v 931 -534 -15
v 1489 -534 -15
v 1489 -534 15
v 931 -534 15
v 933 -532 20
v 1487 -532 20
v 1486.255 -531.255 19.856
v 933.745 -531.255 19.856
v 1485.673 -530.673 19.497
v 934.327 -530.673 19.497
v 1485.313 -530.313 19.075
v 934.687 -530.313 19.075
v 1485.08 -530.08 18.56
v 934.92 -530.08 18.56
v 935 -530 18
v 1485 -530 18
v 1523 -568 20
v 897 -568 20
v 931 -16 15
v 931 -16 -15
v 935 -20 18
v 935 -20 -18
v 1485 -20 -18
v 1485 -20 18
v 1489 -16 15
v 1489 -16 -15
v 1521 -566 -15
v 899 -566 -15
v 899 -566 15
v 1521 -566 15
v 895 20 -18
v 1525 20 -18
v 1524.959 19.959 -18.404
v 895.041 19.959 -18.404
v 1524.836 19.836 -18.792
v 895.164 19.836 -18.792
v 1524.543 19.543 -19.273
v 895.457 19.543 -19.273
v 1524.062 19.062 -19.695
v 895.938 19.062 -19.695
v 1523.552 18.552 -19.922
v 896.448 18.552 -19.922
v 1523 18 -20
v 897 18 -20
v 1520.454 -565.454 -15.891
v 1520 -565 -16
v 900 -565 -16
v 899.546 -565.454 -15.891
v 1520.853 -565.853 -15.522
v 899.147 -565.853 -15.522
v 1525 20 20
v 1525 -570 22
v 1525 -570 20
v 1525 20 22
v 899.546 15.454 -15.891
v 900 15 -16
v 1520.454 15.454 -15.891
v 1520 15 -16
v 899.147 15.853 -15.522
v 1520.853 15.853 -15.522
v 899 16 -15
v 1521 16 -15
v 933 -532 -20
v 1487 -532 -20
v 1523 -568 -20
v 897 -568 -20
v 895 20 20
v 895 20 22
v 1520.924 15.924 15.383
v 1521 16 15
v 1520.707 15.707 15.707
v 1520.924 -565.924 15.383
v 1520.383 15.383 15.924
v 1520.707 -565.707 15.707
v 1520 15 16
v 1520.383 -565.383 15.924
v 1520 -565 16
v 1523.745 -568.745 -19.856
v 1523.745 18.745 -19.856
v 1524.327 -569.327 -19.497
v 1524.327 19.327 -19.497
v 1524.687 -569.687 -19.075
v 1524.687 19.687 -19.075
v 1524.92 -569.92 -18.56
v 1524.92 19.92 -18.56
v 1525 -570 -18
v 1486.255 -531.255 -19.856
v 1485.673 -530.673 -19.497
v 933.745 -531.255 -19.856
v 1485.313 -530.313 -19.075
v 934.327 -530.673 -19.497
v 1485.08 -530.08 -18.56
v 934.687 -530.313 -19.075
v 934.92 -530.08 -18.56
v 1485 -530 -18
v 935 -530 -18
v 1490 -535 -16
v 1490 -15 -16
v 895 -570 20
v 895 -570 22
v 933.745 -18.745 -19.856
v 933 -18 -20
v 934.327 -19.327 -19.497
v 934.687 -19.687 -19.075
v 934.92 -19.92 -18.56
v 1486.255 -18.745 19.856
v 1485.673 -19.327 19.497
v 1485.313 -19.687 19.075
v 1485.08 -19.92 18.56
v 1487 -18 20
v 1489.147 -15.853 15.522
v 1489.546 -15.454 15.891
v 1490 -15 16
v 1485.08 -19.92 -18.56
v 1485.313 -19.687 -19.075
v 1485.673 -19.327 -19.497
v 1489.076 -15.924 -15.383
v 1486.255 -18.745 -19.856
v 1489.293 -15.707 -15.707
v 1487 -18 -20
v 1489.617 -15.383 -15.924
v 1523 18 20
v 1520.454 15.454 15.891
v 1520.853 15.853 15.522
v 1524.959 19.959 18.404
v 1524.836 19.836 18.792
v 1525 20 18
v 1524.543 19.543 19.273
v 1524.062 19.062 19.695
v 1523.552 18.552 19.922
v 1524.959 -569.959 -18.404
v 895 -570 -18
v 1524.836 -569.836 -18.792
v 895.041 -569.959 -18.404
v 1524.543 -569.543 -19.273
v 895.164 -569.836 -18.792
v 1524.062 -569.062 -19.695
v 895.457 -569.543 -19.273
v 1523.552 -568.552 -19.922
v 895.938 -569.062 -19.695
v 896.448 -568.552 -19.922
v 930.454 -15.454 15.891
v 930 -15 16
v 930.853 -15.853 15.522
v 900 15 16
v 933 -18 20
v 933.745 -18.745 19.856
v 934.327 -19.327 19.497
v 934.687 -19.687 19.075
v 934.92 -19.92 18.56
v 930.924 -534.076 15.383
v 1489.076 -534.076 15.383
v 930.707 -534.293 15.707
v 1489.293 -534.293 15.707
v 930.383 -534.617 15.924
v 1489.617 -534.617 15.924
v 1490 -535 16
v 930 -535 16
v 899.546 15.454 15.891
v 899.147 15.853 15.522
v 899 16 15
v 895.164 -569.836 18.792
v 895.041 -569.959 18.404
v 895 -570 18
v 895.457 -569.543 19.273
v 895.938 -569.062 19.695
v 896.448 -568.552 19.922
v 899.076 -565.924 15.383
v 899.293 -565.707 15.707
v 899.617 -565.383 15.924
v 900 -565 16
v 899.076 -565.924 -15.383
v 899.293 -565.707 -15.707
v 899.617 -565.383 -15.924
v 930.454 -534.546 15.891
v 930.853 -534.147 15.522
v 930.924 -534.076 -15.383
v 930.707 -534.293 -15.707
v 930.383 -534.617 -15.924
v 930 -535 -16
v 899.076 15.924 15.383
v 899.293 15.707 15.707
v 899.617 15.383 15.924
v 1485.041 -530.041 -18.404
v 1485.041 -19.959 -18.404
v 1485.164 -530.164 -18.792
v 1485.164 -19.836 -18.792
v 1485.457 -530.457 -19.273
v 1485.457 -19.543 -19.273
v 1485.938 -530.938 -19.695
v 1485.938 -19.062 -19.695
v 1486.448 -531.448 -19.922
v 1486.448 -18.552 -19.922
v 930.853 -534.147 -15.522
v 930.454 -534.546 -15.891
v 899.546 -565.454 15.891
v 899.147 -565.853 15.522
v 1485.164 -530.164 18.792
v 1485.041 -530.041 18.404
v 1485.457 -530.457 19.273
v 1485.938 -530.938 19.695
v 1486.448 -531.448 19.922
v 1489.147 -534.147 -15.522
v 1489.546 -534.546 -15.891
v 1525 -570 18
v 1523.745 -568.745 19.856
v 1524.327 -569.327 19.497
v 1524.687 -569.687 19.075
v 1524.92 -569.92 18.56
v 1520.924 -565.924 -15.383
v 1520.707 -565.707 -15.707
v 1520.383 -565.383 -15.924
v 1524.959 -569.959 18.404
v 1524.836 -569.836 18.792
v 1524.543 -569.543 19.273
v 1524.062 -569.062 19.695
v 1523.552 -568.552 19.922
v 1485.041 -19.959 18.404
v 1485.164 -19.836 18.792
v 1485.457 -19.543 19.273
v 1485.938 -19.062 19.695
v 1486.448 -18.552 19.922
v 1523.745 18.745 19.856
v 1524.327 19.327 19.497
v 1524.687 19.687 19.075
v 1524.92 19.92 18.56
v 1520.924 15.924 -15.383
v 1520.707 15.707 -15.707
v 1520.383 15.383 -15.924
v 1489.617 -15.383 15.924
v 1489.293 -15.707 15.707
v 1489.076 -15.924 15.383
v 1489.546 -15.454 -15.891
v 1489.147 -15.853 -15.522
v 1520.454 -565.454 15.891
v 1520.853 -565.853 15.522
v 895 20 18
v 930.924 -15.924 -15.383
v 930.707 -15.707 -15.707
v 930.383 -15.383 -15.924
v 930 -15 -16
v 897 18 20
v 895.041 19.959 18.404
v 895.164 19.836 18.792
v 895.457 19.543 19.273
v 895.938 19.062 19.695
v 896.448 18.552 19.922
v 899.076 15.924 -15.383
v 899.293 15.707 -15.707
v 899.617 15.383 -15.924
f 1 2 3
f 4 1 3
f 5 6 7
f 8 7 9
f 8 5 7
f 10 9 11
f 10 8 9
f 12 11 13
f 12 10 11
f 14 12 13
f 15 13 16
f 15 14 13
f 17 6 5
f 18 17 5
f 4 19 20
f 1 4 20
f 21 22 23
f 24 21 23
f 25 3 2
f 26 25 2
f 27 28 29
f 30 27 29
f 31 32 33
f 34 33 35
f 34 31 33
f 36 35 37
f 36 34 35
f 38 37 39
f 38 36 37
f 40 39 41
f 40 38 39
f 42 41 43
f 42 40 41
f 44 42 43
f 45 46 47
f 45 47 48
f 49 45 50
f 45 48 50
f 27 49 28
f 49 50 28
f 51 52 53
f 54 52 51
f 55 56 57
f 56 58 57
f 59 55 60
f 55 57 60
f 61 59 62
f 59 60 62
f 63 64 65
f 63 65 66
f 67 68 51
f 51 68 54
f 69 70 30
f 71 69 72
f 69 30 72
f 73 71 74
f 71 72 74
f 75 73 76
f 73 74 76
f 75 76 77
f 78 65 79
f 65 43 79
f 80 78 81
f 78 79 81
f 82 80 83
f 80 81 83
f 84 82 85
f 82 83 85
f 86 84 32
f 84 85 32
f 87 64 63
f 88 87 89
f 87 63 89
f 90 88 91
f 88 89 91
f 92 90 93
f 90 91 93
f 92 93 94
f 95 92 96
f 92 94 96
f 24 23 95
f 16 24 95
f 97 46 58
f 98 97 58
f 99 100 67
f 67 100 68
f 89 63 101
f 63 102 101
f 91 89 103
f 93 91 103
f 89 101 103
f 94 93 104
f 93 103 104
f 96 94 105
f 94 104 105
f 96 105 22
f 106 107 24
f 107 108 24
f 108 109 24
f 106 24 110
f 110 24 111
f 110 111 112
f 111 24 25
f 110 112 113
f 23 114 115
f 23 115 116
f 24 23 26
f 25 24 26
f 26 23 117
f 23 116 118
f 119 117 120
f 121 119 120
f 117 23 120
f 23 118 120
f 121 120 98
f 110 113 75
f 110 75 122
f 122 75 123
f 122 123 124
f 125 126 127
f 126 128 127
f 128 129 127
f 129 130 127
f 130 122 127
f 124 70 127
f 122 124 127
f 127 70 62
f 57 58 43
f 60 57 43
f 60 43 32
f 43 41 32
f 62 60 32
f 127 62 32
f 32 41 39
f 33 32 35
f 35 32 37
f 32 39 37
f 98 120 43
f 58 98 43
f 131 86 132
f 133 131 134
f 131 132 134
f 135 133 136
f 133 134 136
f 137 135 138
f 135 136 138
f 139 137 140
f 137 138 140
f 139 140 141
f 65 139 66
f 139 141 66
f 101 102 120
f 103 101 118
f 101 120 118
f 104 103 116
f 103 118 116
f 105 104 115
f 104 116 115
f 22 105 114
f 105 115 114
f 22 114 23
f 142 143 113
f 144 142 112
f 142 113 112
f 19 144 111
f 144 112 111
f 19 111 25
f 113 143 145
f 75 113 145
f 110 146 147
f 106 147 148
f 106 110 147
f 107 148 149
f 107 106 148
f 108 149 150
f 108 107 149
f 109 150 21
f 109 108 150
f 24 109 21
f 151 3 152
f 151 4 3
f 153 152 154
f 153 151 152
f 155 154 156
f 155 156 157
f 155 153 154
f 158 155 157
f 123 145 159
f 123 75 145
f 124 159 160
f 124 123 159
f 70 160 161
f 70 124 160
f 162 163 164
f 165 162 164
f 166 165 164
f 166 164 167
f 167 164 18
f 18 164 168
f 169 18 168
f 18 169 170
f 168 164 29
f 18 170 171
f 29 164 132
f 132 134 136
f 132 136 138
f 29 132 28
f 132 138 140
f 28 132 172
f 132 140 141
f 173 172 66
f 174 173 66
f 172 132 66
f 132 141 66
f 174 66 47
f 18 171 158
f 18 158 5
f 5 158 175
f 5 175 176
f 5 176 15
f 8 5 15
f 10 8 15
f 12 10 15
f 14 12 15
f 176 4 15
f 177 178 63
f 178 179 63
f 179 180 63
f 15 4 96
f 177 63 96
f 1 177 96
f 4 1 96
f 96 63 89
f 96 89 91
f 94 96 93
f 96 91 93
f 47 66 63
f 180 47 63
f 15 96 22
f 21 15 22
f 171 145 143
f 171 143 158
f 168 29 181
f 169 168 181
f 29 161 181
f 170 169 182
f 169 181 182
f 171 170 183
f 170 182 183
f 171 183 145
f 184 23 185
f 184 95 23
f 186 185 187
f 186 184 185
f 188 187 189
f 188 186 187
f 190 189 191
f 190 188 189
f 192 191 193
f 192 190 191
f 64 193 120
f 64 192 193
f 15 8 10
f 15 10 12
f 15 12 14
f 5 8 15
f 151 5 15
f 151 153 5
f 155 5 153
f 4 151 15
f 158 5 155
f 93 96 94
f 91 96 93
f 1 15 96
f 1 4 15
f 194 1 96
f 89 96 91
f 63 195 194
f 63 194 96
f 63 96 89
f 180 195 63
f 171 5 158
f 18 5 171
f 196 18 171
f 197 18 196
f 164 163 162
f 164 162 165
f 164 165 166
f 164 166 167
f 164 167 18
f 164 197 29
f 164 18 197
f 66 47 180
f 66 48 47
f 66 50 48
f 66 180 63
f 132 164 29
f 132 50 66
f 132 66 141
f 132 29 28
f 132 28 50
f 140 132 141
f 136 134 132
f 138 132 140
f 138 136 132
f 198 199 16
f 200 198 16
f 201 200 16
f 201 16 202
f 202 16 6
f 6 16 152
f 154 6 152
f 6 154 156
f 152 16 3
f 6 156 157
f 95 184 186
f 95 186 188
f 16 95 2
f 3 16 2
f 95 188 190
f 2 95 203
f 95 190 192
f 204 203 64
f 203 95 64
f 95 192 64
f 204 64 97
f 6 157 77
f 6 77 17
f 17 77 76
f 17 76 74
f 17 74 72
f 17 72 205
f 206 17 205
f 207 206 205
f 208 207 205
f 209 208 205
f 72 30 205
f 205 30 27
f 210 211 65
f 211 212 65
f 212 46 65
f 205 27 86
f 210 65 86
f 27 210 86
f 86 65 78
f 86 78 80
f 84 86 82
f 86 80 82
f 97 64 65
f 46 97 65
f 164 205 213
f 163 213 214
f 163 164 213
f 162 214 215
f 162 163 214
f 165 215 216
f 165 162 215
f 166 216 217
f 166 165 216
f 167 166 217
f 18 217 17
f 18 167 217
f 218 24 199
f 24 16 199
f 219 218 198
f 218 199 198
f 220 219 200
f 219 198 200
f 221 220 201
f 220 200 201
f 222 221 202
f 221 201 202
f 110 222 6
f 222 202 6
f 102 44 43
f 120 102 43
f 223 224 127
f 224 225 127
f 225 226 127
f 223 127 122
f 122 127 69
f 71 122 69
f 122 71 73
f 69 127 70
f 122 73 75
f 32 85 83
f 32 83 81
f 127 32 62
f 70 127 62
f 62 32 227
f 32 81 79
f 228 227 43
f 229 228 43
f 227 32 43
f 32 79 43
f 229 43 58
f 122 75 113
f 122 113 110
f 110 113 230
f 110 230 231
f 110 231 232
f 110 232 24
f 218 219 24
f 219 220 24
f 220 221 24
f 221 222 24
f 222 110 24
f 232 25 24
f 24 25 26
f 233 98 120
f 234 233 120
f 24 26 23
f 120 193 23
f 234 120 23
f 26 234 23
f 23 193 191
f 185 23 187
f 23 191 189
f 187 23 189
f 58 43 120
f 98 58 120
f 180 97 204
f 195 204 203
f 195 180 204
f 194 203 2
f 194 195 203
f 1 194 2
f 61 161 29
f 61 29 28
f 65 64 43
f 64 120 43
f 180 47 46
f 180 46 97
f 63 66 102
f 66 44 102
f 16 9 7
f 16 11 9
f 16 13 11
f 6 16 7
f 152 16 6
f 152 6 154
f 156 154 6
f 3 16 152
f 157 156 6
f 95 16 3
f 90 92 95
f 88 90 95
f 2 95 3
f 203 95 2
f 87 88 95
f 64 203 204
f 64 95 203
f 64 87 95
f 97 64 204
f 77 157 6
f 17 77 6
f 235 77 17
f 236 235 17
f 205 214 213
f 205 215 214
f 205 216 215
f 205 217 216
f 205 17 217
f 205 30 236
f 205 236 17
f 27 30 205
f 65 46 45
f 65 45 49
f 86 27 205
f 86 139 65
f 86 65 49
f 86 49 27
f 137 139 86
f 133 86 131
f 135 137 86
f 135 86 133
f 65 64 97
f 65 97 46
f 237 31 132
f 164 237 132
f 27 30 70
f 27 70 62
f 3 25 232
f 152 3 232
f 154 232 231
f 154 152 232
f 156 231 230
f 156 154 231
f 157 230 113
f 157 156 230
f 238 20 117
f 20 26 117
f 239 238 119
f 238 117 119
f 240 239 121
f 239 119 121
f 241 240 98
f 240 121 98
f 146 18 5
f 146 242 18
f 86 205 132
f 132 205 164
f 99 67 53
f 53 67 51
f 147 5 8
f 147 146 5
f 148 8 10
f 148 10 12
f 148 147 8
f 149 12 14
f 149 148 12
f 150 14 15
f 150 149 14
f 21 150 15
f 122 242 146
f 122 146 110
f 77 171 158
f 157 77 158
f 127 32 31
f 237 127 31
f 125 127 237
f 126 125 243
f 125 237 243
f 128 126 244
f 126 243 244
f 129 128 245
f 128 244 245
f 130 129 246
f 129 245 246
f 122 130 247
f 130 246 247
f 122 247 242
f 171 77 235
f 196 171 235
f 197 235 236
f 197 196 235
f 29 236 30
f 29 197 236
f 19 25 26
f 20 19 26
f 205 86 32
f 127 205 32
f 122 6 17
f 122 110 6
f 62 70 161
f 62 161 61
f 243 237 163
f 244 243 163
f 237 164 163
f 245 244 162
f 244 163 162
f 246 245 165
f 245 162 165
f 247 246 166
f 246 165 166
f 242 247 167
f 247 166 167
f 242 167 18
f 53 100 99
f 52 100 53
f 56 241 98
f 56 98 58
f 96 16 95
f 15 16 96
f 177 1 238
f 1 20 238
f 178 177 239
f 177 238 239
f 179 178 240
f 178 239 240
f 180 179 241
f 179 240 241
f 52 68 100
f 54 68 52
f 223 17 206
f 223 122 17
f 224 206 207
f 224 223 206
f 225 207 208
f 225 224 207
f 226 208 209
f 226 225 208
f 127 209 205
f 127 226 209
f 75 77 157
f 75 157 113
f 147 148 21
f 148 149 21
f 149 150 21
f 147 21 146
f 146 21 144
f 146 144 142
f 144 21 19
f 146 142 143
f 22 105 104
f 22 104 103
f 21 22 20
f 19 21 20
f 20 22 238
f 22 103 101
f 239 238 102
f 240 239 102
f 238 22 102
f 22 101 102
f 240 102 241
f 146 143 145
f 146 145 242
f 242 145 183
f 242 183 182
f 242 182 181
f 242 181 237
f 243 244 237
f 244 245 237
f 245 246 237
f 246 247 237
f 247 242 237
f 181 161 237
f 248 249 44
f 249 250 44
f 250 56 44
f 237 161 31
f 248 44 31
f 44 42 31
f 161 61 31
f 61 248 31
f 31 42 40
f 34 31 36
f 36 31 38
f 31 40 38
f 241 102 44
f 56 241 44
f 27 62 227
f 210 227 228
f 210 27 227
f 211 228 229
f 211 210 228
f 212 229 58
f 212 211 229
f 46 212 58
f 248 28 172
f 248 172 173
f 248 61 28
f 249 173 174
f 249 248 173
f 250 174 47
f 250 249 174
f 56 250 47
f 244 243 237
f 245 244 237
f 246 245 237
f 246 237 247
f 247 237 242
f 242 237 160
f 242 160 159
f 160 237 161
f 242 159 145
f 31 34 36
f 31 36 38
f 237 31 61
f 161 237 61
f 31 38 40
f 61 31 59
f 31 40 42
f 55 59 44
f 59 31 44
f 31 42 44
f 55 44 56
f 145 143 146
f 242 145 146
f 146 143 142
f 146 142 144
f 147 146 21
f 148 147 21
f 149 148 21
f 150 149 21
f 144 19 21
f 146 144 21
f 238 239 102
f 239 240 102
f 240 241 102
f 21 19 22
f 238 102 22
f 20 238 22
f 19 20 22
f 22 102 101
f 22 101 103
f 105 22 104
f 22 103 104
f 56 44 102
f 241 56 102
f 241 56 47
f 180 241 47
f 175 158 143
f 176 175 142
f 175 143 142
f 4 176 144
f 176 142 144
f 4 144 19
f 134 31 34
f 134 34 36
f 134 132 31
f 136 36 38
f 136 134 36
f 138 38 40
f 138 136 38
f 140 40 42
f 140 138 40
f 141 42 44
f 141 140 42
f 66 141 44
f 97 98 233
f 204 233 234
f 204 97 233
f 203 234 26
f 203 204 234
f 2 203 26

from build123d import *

# Parameters (mm, degrees)
SKETCH_1_W                 = 630
SKETCH_1_H                 = 590
SM_BASE_FLANGE_1_DEPTH     = 2
SKETCH_4_W                 = 630
SKETCH_4_H                 = 590
SKETCH_4_W_2               = 550
SKETCH_4_H_2               = 510
EXTRUDE_1_DEPTH            = 40
SPLIT_START                = 229
SPLIT_BODIES_1_OUTLINE_W   = 418.911434438
SPLIT_BODIES_1_OUTLINE_H   = 40
SPLIT_BODIES_1_DEPTH       = 864
SPLIT_START_2              = 675.286976033
SPLIT_BODIES_1_2_OUTLINE_W = 447.088565562
SPLIT_BODIES_1_2_OUTLINE_H = 40
SPLIT_BODIES_1_2_DEPTH     = 417.713023967
SPLIT_START_3              = -20
SPLIT_BODIES_1_3_DEPTH     = 40
SPLIT_BODIES_1_4_DEPTH     = 40
SPLIT_BODIES_1_5_DEPTH     = 40
CUT_EXTRUDE_1_DEPTH        = 865.060183089
CUT_EXTRUDE_1_DEPTH_BACK   = 865.060183089
SKETCH_6_W                 = 32
SKETCH_6_H                 = 32
CUT_EXTRUDE_2_DEPTH        = 865.060183089
CUT_EXTRUDE_2_DEPTH_BACK   = 865.060183089
SKETCH_7_W                 = 32
SKETCH_7_H                 = 32
CUT_EXTRUDE_3_DEPTH        = 865.060183089
CUT_EXTRUDE_3_DEPTH_BACK   = 865.060183089
SKETCH_8_W                 = 32
SKETCH_8_H                 = 32
CUT_EXTRUDE_4_DEPTH        = 865.060183089
CUT_EXTRUDE_4_DEPTH_BACK   = 865.060183089
SKETCH_9_W                 = 32
SKETCH_9_H                 = 32
FILLET_1_R                 = 2
FILLET_2_R                 = 1
FILLET_3_R                 = 2
FILLET_4_R                 = 1
FILLET_5_R                 = 2
FILLET_6_R                 = 1
FILLET_7_R                 = 2
FILLET_8_R                 = 1


with BuildPart() as part:
    # 基体-法兰1: sheet metal written as solids
    # Sketch 1 → 基体-法兰1 (new body)
    with BuildSketch(Plane.XY.offset(22)):
        with Locations((1210, -275)):
            Rectangle(SKETCH_1_W, SKETCH_1_H)
    extrude(amount=-SM_BASE_FLANGE_1_DEPTH)


with BuildPart() as body_2:
    # 草图4 → 凸台-拉伸1 (new body)
    with BuildSketch(Plane(origin=(0, 0, 20), x_dir=(-1, 0, 0), z_dir=(0, 0, -1))):
        with Locations((-1210, -275)):
            Rectangle(SKETCH_4_W, SKETCH_4_H)
        with Locations((-1210, -275)):
            Rectangle(SKETCH_4_W_2, SKETCH_4_H_2, mode=Mode.SUBTRACT)
    extrude(amount=EXTRUDE_1_DEPTH)

    # Split Bodies 1: read off the stored shape, not the designer's step
    # Split Bodies 1 outline → Split Bodies 1 (cut)
    with BuildSketch(Plane(origin=(0, 0, 0), x_dir=(0.707106781186546, -0.707106781186549, 0), z_dir=(0.707106781186549, 0.707106781186546, 0)).offset(SPLIT_START)):
        with Locations((826.455717219, 0)):
            Rectangle(SPLIT_BODIES_1_OUTLINE_W, SPLIT_BODIES_1_OUTLINE_H)
    extrude(amount=SPLIT_BODIES_1_DEPTH, mode=Mode.SUBTRACT)

    # Split Bodies 1 2 outline → Split Bodies 1 2 (cut)
    with BuildSketch(Plane(origin=(0, 0, 0), x_dir=(0.707106781186546, -0.707106781186549, 0), z_dir=(0.707106781186549, 0.707106781186546, 0)).offset(SPLIT_START_2)):
        with Locations((1259.455717219, 0)):
            Rectangle(SPLIT_BODIES_1_2_OUTLINE_W, SPLIT_BODIES_1_2_OUTLINE_H)
    extrude(amount=SPLIT_BODIES_1_2_DEPTH, mode=Mode.SUBTRACT)

    # 草图6 → 切除-拉伸1 (cut, two sides: drawn at the far end of the back side and taken through both)
    with BuildSketch(Plane(origin=(1525, -570, 20), x_dir=(0, 0, 1), z_dir=(-1, 0, 0)).offset(-CUT_EXTRUDE_1_DEPTH_BACK)):
        with Locations((-20, 20)):
            Rectangle(SKETCH_6_W, SKETCH_6_H)
    extrude(amount=CUT_EXTRUDE_1_DEPTH + CUT_EXTRUDE_1_DEPTH_BACK, mode=Mode.SUBTRACT)

    # 圆角1
    fillet_1_edges = [body_2.edges().sort_by_distance(p)[0] for p in [
        (1210, -530, 20),
        (1210, -530, -20),
        (1210, -570, 20),
        (1210, -570, -20),
    ]]
    fillet(fillet_1_edges, radius=FILLET_1_R)

    # 圆角2
    fillet_2_edges = [body_2.edges().sort_by_distance(p)[0] for p in [
        (1210, -566, -16),
        (1210, -566, 16),
        (1210, -534, 16),
        (1210, -534, -16),
    ]]
    fillet(fillet_2_edges, radius=FILLET_2_R)


with BuildPart() as body_3:
    # Split Bodies 1 3 outline → Split Bodies 1 3 (new body)
    with BuildSketch(Plane.XY.offset(SPLIT_START_3)):
        Polygon((895, 20), (935, -20), (1485, -20), (1525, 20), align=None)
    extrude(amount=SPLIT_BODIES_1_3_DEPTH)

    # 草图9 → 切除-拉伸4 (cut, two sides: drawn at the far end of the back side and taken through both)
    with BuildSketch(Plane(origin=(895, 20, 20), x_dir=(0, 0, -1), z_dir=(1, 0, 0)).offset(-CUT_EXTRUDE_4_DEPTH_BACK)):
        with Locations((20, -20)):
            Rectangle(SKETCH_9_W, SKETCH_9_H)
    extrude(amount=CUT_EXTRUDE_4_DEPTH + CUT_EXTRUDE_4_DEPTH_BACK, mode=Mode.SUBTRACT)

    # 圆角7
    fillet_7_edges = [body_3.edges().sort_by_distance(p)[0] for p in [
        (1210, -20, 20),
        (1210, -20, -20),
        (1210, 20, 20),
        (1210, 20, -20),
    ]]
    fillet(fillet_7_edges, radius=FILLET_7_R)

    # 圆角8
    fillet_8_edges = [body_3.edges().sort_by_distance(p)[0] for p in [
        (1210, 16, -16),
        (1210, 16, 16),
        (1210, -16, 16),
        (1210, -16, -16),
    ]]
    fillet(fillet_8_edges, radius=FILLET_8_R)


with BuildPart() as body_4:
    # Split Bodies 1 4 outline → Split Bodies 1 4 (new body)
    with BuildSketch(Plane.XY.offset(SPLIT_START_3)):
        Polygon((1485, -530), (1525, -570), (1525, 20), (1485, -20), align=None)
    extrude(amount=SPLIT_BODIES_1_4_DEPTH)

    # 草图7 → 切除-拉伸2 (cut, two sides: drawn at the far end of the back side and taken through both)
    with BuildSketch(Plane(origin=(1525, 20, 20), x_dir=(-1, 0, 0), z_dir=(0, -1, 0)).offset(-CUT_EXTRUDE_2_DEPTH_BACK)):
        with Locations((20, 20)):
            Rectangle(SKETCH_7_W, SKETCH_7_H)
    extrude(amount=CUT_EXTRUDE_2_DEPTH + CUT_EXTRUDE_2_DEPTH_BACK, mode=Mode.SUBTRACT)

    # 圆角3
    fillet_3_edges = [body_4.edges().sort_by_distance(p)[0] for p in [
        (1485, -275, 20),
        (1485, -275, -20),
        (1525, -275, 20),
        (1525, -275, -20),
    ]]
    fillet(fillet_3_edges, radius=FILLET_3_R)

    # 圆角4
    fillet_4_edges = [body_4.edges().sort_by_distance(p)[0] for p in [
        (1521, -275, -16),
        (1521, -275, 16),
        (1489, -275, 16),
        (1489, -275, -16),
    ]]
    fillet(fillet_4_edges, radius=FILLET_4_R)


with BuildPart() as body_5:
    # Split Bodies 1 5 outline → Split Bodies 1 5 (new body)
    with BuildSketch(Plane.XY.offset(SPLIT_START_3)):
        Polygon((895, -570), (935, -530), (935, -20), (895, 20), align=None)
    extrude(amount=SPLIT_BODIES_1_5_DEPTH)

    # 草图8 → 切除-拉伸3 (cut, two sides: drawn at the far end of the back side and taken through both)
    with BuildSketch(Plane(origin=(895, -570, 20), x_dir=(1, 0, 0), z_dir=(0, 1, 0)).offset(-CUT_EXTRUDE_3_DEPTH_BACK)):
        with Locations((20, 20)):
            Rectangle(SKETCH_8_W, SKETCH_8_H)
    extrude(amount=CUT_EXTRUDE_3_DEPTH + CUT_EXTRUDE_3_DEPTH_BACK, mode=Mode.SUBTRACT)

    # 圆角5
    fillet_5_edges = [body_5.edges().sort_by_distance(p)[0] for p in [
        (935, -275, 20),
        (935, -275, -20),
        (895, -275, -20),
        (895, -275, 20),
    ]]
    fillet(fillet_5_edges, radius=FILLET_5_R)

    # 圆角6
    fillet_6_edges = [body_5.edges().sort_by_distance(p)[0] for p in [
        (899, -275, -16),
        (899, -275, 16),
        (931, -275, 16),
        (931, -275, -16),
    ]]
    fillet(fillet_6_edges, radius=FILLET_6_R)


solid = Compound([part.part, body_2.part, body_3.part, body_4.part, body_5.part])
